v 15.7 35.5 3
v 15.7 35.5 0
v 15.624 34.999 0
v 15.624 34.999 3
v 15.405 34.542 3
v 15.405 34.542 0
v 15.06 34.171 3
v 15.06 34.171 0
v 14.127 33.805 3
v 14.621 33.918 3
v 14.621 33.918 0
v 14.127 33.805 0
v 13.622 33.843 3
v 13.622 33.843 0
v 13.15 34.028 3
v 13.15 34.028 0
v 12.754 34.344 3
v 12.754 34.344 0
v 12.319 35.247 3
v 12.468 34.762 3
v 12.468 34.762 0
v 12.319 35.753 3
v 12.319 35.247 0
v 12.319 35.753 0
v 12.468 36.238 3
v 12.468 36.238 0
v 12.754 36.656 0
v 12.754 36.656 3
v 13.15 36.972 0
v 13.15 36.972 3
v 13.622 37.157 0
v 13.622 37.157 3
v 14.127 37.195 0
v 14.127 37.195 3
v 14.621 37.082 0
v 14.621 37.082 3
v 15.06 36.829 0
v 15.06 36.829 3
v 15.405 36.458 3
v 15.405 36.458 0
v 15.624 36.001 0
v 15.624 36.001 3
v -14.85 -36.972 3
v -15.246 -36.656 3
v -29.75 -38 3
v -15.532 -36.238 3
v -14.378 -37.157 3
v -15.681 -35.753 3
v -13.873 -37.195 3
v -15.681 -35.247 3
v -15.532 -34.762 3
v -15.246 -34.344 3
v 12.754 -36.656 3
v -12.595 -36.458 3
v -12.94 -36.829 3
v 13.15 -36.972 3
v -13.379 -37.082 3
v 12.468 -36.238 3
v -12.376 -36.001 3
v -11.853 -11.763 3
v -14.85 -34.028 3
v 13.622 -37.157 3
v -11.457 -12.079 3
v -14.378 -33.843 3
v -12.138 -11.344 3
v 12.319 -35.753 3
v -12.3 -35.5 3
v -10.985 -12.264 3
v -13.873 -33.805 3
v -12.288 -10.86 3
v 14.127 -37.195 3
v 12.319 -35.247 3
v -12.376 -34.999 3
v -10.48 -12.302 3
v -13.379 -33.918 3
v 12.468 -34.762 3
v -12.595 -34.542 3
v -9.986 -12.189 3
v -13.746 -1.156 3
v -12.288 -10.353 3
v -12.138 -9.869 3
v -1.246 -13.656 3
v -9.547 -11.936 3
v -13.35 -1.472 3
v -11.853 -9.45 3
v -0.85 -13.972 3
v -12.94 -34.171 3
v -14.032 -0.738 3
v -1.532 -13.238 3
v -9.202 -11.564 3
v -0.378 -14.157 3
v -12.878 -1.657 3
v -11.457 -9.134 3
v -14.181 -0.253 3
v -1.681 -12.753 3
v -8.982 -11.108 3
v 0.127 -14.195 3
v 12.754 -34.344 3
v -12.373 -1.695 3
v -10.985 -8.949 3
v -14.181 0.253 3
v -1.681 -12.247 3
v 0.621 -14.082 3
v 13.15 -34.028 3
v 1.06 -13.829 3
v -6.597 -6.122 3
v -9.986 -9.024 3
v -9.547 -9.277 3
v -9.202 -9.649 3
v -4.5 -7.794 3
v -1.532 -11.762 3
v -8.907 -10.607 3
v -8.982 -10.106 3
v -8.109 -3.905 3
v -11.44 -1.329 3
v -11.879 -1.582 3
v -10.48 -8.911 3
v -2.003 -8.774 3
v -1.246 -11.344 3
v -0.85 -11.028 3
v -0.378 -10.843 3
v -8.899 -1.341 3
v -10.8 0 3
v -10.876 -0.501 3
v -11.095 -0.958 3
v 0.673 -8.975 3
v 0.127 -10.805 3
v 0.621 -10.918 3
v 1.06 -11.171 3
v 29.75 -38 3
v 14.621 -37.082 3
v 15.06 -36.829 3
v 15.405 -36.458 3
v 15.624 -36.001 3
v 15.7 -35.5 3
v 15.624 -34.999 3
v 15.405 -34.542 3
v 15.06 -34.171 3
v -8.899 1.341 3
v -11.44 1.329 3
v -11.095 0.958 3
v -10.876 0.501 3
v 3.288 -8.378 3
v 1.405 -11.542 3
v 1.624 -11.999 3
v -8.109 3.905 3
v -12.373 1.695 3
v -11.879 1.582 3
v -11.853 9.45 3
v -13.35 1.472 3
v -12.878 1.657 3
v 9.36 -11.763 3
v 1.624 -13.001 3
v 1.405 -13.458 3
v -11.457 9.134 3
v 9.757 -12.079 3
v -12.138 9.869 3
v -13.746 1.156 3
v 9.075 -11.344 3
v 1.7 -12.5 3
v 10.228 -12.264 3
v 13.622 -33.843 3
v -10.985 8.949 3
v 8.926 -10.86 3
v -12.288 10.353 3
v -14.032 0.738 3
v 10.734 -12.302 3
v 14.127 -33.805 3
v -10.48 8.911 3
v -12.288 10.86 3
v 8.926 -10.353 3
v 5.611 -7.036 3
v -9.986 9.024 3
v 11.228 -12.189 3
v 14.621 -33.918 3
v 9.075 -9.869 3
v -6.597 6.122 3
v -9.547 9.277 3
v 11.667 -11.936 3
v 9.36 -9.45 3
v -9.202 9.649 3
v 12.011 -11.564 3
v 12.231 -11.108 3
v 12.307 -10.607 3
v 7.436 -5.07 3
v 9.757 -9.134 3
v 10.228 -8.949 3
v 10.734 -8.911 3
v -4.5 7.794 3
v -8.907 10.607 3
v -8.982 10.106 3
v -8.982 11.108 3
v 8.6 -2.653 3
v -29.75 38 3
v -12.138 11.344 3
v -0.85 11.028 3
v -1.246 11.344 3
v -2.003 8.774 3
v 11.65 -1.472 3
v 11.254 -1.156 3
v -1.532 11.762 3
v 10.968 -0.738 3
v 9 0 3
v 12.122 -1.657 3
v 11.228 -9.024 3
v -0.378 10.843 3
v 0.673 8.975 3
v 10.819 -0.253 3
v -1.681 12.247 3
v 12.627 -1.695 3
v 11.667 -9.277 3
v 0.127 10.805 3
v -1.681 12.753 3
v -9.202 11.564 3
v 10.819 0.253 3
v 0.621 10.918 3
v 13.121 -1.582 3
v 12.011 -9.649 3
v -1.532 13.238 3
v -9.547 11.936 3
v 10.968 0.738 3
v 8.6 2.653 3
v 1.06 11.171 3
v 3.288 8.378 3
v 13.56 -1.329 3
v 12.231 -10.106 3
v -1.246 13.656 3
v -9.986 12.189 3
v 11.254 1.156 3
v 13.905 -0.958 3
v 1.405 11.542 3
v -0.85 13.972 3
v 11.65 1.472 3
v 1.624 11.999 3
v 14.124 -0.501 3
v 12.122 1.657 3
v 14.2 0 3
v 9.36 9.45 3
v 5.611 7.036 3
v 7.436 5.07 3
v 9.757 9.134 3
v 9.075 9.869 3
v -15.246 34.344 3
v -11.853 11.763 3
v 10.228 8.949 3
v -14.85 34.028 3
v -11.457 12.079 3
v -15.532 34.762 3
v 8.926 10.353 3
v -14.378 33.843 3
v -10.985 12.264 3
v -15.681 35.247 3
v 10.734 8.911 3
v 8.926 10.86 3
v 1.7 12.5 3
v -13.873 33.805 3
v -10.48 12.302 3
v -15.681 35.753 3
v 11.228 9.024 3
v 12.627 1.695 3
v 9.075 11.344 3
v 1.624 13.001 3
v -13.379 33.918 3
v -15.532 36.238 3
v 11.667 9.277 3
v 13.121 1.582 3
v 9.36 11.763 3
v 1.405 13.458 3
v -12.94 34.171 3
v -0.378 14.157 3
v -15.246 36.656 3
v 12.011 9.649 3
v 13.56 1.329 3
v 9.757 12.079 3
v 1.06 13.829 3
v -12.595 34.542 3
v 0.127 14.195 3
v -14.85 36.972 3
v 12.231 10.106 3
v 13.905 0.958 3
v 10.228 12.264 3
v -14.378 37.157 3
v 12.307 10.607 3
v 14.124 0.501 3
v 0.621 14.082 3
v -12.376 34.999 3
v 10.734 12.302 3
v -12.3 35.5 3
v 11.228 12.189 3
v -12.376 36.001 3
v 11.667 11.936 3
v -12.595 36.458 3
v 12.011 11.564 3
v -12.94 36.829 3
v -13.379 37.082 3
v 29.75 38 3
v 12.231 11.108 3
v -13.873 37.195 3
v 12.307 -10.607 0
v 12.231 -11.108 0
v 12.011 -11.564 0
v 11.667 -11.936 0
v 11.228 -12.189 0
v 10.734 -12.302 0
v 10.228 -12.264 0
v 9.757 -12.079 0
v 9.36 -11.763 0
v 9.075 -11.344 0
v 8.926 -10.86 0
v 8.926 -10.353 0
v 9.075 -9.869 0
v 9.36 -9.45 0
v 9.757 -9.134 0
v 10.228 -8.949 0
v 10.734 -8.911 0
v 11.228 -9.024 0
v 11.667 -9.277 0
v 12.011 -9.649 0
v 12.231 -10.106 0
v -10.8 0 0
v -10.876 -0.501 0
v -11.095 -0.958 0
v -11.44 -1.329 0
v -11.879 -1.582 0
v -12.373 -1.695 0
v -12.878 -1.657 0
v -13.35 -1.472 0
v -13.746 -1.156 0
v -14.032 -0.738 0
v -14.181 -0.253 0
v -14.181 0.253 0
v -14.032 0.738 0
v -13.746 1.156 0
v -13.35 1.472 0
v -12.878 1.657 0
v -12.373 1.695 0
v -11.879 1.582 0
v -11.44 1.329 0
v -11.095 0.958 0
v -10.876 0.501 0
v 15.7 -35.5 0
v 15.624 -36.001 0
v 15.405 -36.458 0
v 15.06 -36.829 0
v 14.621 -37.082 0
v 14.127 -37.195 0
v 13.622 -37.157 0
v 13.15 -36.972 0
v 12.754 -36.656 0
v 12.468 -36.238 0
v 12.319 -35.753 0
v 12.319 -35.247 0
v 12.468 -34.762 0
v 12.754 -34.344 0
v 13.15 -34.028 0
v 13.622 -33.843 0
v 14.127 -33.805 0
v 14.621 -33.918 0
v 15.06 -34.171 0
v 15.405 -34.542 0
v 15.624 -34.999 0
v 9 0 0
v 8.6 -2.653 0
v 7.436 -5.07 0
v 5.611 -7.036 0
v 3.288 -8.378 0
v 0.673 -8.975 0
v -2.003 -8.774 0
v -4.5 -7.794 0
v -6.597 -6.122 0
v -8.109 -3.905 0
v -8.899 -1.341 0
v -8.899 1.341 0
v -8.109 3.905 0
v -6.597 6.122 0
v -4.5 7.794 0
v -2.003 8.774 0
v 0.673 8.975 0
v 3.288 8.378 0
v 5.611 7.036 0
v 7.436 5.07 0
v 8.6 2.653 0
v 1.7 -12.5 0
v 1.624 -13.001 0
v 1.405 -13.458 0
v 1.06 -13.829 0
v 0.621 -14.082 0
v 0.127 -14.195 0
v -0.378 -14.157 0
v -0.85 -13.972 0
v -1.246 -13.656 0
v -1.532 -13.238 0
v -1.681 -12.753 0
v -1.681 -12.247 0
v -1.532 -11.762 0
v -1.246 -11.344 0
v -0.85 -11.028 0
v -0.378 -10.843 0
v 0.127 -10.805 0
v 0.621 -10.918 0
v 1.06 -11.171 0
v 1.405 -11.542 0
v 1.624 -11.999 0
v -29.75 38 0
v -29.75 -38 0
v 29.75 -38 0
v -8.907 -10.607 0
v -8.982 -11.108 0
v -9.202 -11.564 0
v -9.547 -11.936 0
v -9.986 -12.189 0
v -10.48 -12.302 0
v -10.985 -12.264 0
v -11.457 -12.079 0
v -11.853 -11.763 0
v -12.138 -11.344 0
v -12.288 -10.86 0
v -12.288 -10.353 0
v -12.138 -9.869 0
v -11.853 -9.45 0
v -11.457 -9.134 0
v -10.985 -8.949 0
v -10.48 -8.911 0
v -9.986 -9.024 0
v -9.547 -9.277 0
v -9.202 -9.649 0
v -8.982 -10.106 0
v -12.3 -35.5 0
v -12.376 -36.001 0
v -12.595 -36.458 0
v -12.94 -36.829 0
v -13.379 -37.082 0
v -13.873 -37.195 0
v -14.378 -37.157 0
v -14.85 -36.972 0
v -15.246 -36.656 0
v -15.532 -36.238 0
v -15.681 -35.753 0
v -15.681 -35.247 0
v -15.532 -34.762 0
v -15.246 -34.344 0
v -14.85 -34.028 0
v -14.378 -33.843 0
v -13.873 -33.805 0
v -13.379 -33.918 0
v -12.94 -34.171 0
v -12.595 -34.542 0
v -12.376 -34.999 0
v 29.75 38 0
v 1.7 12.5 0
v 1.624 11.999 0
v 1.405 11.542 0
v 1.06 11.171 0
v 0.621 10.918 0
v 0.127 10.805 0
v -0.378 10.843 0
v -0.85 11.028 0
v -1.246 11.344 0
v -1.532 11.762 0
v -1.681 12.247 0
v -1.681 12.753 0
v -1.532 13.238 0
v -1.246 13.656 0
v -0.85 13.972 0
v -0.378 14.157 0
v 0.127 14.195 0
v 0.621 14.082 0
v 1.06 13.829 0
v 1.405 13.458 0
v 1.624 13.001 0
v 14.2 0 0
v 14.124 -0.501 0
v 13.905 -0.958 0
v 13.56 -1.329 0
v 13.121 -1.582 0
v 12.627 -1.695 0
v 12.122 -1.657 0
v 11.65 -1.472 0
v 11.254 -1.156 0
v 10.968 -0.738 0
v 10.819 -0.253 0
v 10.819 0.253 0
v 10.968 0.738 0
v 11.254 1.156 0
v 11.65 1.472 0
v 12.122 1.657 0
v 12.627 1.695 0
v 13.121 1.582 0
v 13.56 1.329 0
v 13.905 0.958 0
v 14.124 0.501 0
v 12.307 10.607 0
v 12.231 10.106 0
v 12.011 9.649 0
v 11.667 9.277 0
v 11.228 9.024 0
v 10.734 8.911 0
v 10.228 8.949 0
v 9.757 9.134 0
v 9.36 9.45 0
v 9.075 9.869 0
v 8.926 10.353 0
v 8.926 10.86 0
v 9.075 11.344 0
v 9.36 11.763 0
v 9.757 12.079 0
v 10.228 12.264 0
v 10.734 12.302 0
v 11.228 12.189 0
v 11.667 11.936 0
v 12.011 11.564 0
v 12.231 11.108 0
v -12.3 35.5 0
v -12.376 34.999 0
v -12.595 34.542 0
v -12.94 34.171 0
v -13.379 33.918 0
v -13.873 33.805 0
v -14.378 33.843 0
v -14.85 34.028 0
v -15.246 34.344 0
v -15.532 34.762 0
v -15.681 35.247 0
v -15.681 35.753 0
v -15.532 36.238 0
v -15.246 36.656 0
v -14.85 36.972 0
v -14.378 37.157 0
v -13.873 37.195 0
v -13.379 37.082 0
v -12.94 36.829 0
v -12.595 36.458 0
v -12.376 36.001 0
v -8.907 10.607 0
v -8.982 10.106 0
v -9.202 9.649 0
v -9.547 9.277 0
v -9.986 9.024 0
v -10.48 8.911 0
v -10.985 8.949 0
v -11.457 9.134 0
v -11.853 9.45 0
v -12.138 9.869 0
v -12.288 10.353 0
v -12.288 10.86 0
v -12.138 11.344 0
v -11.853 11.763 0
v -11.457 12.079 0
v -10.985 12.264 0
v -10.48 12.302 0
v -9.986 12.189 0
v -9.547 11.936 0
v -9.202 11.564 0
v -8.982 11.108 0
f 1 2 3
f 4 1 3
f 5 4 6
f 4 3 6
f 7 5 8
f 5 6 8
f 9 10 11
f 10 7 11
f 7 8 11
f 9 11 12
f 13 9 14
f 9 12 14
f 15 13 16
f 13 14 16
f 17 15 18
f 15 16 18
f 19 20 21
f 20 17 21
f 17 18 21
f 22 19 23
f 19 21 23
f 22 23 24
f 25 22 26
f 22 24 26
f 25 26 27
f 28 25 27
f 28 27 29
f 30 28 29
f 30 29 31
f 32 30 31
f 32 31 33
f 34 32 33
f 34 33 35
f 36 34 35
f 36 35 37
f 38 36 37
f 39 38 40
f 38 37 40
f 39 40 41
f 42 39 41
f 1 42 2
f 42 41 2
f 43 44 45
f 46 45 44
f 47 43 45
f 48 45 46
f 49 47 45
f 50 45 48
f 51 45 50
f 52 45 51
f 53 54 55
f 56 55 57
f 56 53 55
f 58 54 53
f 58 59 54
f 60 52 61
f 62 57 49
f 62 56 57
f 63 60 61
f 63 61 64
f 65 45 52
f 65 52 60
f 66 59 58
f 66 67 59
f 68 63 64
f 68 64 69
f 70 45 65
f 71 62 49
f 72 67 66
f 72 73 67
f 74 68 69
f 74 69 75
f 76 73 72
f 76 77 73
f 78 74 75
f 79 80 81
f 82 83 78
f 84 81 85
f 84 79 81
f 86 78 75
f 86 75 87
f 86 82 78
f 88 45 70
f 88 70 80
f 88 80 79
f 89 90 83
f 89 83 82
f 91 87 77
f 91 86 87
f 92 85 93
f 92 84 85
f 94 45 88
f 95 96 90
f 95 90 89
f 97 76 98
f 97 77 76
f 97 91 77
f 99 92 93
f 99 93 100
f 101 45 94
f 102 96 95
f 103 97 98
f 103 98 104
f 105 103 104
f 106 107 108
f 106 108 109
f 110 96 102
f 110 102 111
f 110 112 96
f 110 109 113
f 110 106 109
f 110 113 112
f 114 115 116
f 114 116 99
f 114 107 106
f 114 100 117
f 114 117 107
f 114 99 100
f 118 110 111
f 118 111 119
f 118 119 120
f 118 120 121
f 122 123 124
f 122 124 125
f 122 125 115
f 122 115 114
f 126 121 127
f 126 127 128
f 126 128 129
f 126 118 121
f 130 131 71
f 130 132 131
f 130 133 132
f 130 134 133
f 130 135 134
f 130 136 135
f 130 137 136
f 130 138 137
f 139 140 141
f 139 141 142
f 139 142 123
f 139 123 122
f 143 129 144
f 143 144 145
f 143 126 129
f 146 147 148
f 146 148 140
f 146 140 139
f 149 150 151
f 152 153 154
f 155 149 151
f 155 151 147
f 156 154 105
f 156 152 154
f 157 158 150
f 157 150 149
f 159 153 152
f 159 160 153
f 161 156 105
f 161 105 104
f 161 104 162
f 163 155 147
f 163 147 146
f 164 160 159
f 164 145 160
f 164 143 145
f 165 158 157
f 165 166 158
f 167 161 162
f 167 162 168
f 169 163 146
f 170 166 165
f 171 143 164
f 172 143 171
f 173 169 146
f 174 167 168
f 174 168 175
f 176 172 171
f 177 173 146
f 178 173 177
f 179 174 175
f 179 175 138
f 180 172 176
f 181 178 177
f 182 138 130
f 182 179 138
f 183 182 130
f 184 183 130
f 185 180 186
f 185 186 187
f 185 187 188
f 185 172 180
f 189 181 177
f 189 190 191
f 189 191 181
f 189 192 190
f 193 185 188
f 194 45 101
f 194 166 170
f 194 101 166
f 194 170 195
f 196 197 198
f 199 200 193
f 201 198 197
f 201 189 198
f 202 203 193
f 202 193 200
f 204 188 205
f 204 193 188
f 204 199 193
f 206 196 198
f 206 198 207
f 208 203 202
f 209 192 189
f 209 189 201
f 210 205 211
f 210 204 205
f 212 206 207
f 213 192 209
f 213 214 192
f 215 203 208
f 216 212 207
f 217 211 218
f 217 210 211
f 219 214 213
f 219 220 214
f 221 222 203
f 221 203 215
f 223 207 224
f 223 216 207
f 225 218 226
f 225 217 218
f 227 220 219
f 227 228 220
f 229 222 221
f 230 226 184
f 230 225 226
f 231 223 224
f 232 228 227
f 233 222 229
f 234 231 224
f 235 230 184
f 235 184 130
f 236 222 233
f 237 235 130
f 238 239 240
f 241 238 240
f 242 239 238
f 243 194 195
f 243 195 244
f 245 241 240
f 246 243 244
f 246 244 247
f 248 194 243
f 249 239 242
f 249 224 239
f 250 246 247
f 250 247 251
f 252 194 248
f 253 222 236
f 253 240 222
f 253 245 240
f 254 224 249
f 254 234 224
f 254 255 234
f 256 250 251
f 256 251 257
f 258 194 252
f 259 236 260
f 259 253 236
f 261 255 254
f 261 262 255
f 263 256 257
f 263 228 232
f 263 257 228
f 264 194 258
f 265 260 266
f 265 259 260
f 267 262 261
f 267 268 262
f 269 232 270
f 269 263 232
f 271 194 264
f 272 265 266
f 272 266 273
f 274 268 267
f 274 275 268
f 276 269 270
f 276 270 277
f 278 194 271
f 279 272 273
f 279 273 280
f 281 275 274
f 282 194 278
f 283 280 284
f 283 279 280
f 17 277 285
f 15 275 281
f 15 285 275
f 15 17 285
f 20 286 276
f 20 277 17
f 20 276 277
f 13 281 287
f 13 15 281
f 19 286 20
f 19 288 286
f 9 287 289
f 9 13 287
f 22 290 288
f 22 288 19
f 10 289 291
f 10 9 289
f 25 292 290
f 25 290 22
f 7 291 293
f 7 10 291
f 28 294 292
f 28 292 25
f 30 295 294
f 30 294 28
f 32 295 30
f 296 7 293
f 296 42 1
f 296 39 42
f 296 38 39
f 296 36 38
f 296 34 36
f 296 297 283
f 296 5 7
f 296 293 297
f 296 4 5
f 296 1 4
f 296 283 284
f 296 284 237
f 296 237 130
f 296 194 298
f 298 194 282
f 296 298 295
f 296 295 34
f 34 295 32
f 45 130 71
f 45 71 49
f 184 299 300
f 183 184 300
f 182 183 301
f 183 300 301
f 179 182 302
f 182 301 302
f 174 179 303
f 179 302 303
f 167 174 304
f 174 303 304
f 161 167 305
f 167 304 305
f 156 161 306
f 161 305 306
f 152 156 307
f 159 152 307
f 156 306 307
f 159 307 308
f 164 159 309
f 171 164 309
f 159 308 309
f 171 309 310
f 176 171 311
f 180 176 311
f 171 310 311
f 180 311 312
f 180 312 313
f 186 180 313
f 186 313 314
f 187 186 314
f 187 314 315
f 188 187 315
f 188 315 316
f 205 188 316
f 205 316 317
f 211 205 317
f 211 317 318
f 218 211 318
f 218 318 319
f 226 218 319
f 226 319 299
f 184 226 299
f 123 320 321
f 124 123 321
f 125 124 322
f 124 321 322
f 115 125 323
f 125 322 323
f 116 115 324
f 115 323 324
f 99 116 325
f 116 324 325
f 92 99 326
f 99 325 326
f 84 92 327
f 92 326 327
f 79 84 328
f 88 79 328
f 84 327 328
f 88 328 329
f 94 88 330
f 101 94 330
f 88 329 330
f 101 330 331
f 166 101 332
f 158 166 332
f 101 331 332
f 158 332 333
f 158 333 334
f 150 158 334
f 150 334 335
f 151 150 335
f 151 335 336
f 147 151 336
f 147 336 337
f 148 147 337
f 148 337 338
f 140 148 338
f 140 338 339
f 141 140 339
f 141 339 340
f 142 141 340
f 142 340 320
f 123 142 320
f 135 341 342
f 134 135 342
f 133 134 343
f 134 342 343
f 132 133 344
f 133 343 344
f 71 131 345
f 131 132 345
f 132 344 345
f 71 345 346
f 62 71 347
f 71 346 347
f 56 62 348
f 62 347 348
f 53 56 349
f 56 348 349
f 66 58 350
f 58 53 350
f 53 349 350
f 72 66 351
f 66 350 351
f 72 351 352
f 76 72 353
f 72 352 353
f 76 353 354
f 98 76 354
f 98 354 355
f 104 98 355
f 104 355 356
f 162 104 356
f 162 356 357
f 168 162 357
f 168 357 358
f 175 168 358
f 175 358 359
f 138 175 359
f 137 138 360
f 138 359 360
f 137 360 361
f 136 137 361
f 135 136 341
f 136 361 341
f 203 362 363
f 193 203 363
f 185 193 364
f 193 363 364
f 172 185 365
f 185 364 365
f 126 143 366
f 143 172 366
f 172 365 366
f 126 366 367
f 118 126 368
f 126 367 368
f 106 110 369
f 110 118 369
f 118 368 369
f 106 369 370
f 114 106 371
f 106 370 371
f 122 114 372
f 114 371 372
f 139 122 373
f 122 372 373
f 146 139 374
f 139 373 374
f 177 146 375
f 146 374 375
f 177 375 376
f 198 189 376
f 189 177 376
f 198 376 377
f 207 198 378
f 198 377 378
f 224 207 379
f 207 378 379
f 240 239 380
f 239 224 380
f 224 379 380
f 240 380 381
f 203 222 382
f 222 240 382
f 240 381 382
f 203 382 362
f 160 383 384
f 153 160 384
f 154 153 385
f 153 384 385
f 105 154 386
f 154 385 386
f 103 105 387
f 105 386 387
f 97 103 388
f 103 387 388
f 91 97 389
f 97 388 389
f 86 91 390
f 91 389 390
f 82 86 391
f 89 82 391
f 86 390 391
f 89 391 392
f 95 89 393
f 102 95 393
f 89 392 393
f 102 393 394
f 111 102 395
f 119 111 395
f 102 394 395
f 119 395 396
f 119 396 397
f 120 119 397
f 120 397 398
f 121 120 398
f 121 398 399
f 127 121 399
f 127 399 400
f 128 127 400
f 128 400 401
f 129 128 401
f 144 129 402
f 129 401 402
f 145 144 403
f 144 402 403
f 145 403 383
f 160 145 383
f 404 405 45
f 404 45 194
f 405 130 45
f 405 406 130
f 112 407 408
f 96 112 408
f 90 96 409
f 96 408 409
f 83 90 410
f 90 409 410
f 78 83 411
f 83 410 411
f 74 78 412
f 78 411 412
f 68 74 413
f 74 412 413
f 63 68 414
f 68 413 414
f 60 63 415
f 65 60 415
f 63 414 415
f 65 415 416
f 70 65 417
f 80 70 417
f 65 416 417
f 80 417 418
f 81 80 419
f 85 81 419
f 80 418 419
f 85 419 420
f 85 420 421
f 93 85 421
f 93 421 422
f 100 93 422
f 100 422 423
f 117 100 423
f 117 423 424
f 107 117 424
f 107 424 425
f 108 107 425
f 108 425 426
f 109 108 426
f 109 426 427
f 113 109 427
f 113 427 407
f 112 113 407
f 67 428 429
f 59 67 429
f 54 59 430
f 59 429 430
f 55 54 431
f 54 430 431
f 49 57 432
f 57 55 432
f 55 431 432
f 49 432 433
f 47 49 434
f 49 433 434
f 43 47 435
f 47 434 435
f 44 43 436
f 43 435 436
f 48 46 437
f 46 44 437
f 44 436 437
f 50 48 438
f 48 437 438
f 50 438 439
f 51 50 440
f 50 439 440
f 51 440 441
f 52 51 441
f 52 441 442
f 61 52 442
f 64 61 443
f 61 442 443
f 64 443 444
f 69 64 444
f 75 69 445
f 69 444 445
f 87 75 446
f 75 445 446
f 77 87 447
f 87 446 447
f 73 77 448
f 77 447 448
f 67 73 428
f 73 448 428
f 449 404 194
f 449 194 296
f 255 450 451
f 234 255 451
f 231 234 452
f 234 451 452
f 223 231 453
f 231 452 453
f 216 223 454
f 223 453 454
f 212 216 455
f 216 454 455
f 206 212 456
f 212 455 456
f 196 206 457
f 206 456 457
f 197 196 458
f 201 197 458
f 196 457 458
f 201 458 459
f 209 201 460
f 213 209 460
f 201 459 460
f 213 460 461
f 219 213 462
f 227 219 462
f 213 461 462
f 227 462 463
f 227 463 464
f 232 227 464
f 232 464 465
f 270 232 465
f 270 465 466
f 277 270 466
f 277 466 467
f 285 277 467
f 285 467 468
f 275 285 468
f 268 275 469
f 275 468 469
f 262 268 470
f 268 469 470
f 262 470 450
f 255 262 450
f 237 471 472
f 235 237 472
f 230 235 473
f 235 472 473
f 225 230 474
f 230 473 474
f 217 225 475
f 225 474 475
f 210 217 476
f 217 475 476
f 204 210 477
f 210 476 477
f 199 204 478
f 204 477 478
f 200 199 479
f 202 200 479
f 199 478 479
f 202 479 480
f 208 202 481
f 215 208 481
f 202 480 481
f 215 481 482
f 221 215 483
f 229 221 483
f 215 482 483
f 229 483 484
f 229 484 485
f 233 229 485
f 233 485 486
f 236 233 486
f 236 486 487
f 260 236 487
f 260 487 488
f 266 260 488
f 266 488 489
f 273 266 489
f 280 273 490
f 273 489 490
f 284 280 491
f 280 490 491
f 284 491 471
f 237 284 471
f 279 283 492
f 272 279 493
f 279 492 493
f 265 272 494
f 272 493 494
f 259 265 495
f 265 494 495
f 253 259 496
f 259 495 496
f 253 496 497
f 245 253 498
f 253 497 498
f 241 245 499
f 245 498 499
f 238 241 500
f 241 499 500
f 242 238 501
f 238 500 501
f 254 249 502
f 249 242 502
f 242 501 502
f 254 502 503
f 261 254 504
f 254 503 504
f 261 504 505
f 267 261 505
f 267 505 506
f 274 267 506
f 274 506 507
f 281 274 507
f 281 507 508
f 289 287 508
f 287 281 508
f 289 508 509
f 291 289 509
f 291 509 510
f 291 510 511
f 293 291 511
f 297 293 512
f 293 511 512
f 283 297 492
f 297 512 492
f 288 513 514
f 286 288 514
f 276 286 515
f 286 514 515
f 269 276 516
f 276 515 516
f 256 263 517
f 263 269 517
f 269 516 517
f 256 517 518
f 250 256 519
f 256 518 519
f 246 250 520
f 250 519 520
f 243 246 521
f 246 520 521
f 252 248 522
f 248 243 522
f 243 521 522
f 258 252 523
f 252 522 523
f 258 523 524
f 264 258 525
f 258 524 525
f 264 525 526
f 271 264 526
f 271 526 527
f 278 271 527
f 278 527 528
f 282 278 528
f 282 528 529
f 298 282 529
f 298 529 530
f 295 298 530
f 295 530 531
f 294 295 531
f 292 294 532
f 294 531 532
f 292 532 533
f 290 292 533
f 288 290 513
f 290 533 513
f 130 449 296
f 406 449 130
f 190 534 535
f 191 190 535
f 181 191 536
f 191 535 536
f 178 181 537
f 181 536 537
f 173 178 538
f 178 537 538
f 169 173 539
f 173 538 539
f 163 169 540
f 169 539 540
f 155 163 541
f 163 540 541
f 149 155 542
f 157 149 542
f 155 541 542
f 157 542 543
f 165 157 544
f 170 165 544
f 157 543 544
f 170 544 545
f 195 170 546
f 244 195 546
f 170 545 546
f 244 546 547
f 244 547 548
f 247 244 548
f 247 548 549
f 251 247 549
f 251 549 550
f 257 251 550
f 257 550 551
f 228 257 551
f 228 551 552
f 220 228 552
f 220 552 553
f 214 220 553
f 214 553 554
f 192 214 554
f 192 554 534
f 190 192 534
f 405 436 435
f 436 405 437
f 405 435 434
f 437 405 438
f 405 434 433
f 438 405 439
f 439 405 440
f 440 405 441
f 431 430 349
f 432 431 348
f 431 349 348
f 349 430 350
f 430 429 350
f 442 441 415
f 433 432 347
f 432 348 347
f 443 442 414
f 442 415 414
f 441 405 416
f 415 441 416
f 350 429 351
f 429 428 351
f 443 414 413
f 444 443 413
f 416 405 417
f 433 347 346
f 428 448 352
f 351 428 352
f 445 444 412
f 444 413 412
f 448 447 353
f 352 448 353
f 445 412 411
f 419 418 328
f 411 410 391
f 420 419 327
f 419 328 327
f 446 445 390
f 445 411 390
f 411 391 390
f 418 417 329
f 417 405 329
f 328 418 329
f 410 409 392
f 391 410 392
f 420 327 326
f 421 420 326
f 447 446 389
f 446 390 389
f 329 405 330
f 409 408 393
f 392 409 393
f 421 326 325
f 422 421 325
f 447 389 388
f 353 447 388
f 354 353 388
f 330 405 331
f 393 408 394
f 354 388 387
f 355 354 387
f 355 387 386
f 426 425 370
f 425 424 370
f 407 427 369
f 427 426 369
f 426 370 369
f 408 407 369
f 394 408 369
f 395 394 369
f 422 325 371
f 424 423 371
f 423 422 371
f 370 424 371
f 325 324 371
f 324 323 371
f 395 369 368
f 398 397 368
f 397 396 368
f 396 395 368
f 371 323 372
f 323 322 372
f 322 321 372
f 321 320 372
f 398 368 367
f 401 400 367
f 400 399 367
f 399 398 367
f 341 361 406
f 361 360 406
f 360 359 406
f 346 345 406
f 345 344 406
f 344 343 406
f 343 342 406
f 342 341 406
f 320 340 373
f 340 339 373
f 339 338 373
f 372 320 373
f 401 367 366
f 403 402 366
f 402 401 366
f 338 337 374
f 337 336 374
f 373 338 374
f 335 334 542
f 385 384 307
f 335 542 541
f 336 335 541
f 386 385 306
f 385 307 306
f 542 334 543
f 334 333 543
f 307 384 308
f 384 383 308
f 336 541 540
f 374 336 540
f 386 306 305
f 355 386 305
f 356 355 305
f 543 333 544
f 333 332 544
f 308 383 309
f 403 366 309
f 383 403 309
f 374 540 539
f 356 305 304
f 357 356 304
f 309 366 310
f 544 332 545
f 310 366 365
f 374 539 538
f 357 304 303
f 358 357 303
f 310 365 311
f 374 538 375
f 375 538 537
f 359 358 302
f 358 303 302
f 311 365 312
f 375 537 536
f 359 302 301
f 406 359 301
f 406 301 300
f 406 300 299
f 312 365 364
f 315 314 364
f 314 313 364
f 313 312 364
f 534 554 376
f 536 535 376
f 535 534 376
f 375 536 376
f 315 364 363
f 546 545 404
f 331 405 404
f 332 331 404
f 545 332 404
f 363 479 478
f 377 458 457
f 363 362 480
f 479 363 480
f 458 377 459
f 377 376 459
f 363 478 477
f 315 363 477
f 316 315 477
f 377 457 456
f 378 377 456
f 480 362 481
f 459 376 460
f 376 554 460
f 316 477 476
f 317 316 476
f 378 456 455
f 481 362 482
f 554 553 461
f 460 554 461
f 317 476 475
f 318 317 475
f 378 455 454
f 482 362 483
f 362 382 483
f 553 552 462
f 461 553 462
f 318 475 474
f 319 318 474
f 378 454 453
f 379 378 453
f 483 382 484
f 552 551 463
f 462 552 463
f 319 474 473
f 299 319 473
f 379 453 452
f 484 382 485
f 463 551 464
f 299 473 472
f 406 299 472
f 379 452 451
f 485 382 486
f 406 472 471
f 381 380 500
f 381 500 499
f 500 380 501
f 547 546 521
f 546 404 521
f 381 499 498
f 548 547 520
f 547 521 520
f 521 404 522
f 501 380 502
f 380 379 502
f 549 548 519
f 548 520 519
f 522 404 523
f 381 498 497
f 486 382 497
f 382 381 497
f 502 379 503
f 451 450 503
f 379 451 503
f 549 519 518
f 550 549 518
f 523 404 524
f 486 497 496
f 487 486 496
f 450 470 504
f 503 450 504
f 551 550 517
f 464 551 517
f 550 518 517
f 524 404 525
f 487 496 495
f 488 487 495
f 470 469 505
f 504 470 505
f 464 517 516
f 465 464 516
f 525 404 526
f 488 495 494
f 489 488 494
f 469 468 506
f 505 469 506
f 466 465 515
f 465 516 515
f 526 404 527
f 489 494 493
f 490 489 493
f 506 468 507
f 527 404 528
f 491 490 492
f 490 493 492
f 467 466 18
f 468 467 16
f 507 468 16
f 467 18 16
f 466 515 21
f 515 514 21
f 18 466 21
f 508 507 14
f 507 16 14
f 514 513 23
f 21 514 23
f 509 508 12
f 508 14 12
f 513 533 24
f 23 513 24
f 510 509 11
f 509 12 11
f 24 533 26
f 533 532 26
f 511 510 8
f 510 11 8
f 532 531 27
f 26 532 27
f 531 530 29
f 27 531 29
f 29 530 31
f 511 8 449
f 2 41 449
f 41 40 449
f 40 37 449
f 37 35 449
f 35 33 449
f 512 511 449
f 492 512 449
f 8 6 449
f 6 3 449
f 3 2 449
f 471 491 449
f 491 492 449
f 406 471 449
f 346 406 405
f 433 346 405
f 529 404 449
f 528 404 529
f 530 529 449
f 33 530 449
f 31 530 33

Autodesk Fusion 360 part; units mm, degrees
sketch "Sketch1" plane through (0, 0, 0) normal (0, 0, 1) x (1, 0, 0)
  circle A0 centre (0, 0) radius 29.75
  circle A1 centre (0, 0) radius 12.5
  circle A2 centre (0, 0) radius 15
  circle A3 centre (0, 12.5) radius 1.7
  circle A4 centre (-10.6066, 10.6066) radius 1.7
  circle A5 centre (-10.6066, -10.6066) radius 1.7
  circle A6 centre (-12.5, 0) radius 1.7
  circle A7 centre (10.6066, -10.6066) radius 1.7
  circle A8 centre (0, -12.5) radius 1.7
  circle A9 centre (10.6066, 10.6066) radius 1.7
  circle A10 centre (12.5, 0) radius 1.7
  circle A11 centre (-14, 35.5) radius 1.7
  circle A12 centre (14, 35.5) radius 1.7
  circle A13 centre (14, -35.5) radius 1.7
  circle A14 centre (-14, -35.5) radius 1.7
  line L0 (-29.75, 38) -> (29.75, 38)
  line L1 (29.75, 38) -> (29.75, -38)
  line L2 (29.75, -38) -> (-29.75, -38)
  line L3 (-29.75, -38) -> (-29.75, 38)
  circle A15 centre (0, 0) radius 9
  dimension "d1" = 59.5
  dimension "d2" = 25
  dimension "d3" = 30
  dimension "d5" = 3.4
  dimension "d10" = 360
  dimension "d13" = 3.4
  dimension "d14" = 3.4
  dimension "d15" = 3.4
  dimension "d16" = 3.4
  dimension "d17" = 59.5
  dimension "d18" = 76
  dimension "d19" = 18
extrude "Extrude1" add sketch "Sketch1" along normal blind 3 contours A0 | A0 L1 L2 L3 | A0 L0 L1 L3 | A1 A3 A6 A8 A10 | A2 A4 A5 A7 A9
